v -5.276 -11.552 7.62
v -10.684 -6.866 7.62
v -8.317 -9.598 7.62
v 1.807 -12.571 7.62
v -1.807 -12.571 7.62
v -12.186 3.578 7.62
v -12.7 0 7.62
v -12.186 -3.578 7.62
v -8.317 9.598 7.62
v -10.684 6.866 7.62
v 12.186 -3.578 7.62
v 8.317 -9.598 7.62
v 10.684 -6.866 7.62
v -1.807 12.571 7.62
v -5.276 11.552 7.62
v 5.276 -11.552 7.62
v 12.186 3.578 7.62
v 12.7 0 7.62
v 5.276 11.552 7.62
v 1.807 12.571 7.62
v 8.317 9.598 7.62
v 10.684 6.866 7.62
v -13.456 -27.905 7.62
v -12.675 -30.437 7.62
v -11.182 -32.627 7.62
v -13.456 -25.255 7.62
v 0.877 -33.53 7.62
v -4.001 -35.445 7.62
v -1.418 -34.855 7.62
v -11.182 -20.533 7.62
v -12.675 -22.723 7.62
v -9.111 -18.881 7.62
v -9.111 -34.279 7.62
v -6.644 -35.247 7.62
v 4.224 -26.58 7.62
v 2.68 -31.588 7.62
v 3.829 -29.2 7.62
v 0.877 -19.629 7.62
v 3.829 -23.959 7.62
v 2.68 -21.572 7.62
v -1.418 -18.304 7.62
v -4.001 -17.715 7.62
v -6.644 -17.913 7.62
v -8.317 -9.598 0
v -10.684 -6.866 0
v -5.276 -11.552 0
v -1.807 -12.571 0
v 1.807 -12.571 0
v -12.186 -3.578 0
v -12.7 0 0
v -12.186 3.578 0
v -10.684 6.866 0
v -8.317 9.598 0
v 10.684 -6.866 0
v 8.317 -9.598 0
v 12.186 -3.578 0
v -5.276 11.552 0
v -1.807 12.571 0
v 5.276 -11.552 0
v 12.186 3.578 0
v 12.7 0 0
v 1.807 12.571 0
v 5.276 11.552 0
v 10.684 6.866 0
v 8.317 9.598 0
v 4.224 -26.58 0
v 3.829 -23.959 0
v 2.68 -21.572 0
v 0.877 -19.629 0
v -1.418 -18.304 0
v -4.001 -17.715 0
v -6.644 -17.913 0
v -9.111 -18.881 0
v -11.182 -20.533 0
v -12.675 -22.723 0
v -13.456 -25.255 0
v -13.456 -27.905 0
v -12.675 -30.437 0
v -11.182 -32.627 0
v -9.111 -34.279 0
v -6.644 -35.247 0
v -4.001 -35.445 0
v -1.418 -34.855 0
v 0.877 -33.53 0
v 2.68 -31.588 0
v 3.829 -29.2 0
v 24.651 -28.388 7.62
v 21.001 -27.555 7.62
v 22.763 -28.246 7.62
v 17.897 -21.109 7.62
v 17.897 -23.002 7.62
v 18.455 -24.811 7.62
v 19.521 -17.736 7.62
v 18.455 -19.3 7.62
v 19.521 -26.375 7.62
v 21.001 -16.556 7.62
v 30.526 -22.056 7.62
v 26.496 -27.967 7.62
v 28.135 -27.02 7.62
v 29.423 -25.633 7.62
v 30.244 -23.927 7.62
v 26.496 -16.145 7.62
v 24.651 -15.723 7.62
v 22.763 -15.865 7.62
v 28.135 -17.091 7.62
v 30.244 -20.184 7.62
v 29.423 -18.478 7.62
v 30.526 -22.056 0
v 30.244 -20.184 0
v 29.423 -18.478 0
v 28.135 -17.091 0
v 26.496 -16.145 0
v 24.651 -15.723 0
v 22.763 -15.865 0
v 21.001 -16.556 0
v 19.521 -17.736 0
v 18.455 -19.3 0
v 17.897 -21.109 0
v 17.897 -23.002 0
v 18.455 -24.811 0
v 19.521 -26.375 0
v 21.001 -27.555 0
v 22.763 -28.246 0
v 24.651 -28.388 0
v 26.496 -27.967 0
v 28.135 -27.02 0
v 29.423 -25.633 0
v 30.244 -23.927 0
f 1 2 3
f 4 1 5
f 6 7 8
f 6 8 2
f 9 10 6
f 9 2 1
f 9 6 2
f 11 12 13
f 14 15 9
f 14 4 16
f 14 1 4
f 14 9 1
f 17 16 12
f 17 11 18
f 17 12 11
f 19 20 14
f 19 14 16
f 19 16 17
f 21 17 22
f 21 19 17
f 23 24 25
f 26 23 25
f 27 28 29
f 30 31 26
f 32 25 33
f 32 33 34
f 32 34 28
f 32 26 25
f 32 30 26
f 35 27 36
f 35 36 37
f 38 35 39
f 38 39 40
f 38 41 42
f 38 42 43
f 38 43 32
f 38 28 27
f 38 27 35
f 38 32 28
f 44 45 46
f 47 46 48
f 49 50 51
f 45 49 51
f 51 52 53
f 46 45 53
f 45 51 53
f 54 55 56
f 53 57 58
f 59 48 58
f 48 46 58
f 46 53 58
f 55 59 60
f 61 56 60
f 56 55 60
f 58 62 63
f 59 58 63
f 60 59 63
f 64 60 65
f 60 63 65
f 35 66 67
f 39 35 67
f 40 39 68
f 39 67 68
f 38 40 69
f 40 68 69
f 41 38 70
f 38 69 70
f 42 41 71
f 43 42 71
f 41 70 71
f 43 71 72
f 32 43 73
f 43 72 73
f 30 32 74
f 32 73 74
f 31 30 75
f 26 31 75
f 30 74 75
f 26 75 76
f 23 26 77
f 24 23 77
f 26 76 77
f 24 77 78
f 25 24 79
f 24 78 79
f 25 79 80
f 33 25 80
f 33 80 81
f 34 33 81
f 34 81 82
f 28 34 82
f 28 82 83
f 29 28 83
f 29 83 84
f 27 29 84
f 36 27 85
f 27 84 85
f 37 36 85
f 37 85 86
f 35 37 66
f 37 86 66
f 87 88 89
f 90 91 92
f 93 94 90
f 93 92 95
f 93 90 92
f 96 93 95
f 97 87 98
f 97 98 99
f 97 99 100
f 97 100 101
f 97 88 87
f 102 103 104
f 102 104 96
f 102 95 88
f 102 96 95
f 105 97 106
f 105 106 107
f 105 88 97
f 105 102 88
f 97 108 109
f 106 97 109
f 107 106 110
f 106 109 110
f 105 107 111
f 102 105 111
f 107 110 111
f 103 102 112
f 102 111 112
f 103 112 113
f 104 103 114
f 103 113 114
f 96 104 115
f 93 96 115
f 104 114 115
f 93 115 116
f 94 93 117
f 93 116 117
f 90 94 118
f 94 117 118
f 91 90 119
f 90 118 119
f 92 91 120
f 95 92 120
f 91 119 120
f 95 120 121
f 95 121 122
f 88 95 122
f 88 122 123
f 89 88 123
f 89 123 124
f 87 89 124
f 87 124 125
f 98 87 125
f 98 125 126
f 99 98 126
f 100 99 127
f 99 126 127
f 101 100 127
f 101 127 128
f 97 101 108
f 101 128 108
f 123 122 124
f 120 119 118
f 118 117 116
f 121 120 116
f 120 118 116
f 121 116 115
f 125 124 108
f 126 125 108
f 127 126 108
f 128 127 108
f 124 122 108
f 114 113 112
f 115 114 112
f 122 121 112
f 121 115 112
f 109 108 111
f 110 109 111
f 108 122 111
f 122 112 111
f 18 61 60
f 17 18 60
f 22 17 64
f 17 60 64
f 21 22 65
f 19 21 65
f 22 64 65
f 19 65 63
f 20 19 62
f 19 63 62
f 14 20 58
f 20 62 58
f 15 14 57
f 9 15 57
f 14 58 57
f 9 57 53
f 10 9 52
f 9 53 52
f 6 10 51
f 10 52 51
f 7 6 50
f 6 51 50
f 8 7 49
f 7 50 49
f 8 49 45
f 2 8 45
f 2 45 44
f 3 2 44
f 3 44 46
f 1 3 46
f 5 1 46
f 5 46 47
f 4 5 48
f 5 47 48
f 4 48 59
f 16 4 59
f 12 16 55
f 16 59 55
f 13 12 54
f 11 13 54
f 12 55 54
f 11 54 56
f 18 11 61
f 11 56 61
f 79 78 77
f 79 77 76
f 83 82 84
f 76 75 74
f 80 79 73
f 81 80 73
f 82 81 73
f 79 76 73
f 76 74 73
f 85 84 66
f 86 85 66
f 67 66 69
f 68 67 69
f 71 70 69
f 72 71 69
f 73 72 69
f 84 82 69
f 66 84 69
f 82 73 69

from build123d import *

# Parameters (mm, degrees)
SKETCH1_R             = 12.7
BOSS_EXTRUDE1_DEPTH   = 7.62
SKETCH1_R_2           = 6.35
BOSS_EXTRUDE1_2_DEPTH = 7.62
SKETCH1_R_3           = 8.89
BOSS_EXTRUDE1_3_DEPTH = 7.62


with BuildPart() as part:
    # Sketch1 → Boss-Extrude1 (new body)
    with BuildSketch(Plane.XY):
        Circle(SKETCH1_R)
    extrude(amount=BOSS_EXTRUDE1_DEPTH)


with BuildPart() as body_2:
    # Sketch1 → Boss-Extrude1 2 (new body)
    with BuildSketch(Plane.XY):
        with Locations((24.176307654, -22.055578912)):
            Circle(SKETCH1_R_2)
    extrude(amount=BOSS_EXTRUDE1_2_DEPTH)


with BuildPart() as body_3:
    # Sketch1 → Boss-Extrude1 3 (new body)
    with BuildSketch(Plane.XY):
        with Locations((-4.665603231, -26.579800228)):
            Circle(SKETCH1_R_3)
    extrude(amount=BOSS_EXTRUDE1_3_DEPTH)


solid = Compound([part.part, body_2.part, body_3.part])
